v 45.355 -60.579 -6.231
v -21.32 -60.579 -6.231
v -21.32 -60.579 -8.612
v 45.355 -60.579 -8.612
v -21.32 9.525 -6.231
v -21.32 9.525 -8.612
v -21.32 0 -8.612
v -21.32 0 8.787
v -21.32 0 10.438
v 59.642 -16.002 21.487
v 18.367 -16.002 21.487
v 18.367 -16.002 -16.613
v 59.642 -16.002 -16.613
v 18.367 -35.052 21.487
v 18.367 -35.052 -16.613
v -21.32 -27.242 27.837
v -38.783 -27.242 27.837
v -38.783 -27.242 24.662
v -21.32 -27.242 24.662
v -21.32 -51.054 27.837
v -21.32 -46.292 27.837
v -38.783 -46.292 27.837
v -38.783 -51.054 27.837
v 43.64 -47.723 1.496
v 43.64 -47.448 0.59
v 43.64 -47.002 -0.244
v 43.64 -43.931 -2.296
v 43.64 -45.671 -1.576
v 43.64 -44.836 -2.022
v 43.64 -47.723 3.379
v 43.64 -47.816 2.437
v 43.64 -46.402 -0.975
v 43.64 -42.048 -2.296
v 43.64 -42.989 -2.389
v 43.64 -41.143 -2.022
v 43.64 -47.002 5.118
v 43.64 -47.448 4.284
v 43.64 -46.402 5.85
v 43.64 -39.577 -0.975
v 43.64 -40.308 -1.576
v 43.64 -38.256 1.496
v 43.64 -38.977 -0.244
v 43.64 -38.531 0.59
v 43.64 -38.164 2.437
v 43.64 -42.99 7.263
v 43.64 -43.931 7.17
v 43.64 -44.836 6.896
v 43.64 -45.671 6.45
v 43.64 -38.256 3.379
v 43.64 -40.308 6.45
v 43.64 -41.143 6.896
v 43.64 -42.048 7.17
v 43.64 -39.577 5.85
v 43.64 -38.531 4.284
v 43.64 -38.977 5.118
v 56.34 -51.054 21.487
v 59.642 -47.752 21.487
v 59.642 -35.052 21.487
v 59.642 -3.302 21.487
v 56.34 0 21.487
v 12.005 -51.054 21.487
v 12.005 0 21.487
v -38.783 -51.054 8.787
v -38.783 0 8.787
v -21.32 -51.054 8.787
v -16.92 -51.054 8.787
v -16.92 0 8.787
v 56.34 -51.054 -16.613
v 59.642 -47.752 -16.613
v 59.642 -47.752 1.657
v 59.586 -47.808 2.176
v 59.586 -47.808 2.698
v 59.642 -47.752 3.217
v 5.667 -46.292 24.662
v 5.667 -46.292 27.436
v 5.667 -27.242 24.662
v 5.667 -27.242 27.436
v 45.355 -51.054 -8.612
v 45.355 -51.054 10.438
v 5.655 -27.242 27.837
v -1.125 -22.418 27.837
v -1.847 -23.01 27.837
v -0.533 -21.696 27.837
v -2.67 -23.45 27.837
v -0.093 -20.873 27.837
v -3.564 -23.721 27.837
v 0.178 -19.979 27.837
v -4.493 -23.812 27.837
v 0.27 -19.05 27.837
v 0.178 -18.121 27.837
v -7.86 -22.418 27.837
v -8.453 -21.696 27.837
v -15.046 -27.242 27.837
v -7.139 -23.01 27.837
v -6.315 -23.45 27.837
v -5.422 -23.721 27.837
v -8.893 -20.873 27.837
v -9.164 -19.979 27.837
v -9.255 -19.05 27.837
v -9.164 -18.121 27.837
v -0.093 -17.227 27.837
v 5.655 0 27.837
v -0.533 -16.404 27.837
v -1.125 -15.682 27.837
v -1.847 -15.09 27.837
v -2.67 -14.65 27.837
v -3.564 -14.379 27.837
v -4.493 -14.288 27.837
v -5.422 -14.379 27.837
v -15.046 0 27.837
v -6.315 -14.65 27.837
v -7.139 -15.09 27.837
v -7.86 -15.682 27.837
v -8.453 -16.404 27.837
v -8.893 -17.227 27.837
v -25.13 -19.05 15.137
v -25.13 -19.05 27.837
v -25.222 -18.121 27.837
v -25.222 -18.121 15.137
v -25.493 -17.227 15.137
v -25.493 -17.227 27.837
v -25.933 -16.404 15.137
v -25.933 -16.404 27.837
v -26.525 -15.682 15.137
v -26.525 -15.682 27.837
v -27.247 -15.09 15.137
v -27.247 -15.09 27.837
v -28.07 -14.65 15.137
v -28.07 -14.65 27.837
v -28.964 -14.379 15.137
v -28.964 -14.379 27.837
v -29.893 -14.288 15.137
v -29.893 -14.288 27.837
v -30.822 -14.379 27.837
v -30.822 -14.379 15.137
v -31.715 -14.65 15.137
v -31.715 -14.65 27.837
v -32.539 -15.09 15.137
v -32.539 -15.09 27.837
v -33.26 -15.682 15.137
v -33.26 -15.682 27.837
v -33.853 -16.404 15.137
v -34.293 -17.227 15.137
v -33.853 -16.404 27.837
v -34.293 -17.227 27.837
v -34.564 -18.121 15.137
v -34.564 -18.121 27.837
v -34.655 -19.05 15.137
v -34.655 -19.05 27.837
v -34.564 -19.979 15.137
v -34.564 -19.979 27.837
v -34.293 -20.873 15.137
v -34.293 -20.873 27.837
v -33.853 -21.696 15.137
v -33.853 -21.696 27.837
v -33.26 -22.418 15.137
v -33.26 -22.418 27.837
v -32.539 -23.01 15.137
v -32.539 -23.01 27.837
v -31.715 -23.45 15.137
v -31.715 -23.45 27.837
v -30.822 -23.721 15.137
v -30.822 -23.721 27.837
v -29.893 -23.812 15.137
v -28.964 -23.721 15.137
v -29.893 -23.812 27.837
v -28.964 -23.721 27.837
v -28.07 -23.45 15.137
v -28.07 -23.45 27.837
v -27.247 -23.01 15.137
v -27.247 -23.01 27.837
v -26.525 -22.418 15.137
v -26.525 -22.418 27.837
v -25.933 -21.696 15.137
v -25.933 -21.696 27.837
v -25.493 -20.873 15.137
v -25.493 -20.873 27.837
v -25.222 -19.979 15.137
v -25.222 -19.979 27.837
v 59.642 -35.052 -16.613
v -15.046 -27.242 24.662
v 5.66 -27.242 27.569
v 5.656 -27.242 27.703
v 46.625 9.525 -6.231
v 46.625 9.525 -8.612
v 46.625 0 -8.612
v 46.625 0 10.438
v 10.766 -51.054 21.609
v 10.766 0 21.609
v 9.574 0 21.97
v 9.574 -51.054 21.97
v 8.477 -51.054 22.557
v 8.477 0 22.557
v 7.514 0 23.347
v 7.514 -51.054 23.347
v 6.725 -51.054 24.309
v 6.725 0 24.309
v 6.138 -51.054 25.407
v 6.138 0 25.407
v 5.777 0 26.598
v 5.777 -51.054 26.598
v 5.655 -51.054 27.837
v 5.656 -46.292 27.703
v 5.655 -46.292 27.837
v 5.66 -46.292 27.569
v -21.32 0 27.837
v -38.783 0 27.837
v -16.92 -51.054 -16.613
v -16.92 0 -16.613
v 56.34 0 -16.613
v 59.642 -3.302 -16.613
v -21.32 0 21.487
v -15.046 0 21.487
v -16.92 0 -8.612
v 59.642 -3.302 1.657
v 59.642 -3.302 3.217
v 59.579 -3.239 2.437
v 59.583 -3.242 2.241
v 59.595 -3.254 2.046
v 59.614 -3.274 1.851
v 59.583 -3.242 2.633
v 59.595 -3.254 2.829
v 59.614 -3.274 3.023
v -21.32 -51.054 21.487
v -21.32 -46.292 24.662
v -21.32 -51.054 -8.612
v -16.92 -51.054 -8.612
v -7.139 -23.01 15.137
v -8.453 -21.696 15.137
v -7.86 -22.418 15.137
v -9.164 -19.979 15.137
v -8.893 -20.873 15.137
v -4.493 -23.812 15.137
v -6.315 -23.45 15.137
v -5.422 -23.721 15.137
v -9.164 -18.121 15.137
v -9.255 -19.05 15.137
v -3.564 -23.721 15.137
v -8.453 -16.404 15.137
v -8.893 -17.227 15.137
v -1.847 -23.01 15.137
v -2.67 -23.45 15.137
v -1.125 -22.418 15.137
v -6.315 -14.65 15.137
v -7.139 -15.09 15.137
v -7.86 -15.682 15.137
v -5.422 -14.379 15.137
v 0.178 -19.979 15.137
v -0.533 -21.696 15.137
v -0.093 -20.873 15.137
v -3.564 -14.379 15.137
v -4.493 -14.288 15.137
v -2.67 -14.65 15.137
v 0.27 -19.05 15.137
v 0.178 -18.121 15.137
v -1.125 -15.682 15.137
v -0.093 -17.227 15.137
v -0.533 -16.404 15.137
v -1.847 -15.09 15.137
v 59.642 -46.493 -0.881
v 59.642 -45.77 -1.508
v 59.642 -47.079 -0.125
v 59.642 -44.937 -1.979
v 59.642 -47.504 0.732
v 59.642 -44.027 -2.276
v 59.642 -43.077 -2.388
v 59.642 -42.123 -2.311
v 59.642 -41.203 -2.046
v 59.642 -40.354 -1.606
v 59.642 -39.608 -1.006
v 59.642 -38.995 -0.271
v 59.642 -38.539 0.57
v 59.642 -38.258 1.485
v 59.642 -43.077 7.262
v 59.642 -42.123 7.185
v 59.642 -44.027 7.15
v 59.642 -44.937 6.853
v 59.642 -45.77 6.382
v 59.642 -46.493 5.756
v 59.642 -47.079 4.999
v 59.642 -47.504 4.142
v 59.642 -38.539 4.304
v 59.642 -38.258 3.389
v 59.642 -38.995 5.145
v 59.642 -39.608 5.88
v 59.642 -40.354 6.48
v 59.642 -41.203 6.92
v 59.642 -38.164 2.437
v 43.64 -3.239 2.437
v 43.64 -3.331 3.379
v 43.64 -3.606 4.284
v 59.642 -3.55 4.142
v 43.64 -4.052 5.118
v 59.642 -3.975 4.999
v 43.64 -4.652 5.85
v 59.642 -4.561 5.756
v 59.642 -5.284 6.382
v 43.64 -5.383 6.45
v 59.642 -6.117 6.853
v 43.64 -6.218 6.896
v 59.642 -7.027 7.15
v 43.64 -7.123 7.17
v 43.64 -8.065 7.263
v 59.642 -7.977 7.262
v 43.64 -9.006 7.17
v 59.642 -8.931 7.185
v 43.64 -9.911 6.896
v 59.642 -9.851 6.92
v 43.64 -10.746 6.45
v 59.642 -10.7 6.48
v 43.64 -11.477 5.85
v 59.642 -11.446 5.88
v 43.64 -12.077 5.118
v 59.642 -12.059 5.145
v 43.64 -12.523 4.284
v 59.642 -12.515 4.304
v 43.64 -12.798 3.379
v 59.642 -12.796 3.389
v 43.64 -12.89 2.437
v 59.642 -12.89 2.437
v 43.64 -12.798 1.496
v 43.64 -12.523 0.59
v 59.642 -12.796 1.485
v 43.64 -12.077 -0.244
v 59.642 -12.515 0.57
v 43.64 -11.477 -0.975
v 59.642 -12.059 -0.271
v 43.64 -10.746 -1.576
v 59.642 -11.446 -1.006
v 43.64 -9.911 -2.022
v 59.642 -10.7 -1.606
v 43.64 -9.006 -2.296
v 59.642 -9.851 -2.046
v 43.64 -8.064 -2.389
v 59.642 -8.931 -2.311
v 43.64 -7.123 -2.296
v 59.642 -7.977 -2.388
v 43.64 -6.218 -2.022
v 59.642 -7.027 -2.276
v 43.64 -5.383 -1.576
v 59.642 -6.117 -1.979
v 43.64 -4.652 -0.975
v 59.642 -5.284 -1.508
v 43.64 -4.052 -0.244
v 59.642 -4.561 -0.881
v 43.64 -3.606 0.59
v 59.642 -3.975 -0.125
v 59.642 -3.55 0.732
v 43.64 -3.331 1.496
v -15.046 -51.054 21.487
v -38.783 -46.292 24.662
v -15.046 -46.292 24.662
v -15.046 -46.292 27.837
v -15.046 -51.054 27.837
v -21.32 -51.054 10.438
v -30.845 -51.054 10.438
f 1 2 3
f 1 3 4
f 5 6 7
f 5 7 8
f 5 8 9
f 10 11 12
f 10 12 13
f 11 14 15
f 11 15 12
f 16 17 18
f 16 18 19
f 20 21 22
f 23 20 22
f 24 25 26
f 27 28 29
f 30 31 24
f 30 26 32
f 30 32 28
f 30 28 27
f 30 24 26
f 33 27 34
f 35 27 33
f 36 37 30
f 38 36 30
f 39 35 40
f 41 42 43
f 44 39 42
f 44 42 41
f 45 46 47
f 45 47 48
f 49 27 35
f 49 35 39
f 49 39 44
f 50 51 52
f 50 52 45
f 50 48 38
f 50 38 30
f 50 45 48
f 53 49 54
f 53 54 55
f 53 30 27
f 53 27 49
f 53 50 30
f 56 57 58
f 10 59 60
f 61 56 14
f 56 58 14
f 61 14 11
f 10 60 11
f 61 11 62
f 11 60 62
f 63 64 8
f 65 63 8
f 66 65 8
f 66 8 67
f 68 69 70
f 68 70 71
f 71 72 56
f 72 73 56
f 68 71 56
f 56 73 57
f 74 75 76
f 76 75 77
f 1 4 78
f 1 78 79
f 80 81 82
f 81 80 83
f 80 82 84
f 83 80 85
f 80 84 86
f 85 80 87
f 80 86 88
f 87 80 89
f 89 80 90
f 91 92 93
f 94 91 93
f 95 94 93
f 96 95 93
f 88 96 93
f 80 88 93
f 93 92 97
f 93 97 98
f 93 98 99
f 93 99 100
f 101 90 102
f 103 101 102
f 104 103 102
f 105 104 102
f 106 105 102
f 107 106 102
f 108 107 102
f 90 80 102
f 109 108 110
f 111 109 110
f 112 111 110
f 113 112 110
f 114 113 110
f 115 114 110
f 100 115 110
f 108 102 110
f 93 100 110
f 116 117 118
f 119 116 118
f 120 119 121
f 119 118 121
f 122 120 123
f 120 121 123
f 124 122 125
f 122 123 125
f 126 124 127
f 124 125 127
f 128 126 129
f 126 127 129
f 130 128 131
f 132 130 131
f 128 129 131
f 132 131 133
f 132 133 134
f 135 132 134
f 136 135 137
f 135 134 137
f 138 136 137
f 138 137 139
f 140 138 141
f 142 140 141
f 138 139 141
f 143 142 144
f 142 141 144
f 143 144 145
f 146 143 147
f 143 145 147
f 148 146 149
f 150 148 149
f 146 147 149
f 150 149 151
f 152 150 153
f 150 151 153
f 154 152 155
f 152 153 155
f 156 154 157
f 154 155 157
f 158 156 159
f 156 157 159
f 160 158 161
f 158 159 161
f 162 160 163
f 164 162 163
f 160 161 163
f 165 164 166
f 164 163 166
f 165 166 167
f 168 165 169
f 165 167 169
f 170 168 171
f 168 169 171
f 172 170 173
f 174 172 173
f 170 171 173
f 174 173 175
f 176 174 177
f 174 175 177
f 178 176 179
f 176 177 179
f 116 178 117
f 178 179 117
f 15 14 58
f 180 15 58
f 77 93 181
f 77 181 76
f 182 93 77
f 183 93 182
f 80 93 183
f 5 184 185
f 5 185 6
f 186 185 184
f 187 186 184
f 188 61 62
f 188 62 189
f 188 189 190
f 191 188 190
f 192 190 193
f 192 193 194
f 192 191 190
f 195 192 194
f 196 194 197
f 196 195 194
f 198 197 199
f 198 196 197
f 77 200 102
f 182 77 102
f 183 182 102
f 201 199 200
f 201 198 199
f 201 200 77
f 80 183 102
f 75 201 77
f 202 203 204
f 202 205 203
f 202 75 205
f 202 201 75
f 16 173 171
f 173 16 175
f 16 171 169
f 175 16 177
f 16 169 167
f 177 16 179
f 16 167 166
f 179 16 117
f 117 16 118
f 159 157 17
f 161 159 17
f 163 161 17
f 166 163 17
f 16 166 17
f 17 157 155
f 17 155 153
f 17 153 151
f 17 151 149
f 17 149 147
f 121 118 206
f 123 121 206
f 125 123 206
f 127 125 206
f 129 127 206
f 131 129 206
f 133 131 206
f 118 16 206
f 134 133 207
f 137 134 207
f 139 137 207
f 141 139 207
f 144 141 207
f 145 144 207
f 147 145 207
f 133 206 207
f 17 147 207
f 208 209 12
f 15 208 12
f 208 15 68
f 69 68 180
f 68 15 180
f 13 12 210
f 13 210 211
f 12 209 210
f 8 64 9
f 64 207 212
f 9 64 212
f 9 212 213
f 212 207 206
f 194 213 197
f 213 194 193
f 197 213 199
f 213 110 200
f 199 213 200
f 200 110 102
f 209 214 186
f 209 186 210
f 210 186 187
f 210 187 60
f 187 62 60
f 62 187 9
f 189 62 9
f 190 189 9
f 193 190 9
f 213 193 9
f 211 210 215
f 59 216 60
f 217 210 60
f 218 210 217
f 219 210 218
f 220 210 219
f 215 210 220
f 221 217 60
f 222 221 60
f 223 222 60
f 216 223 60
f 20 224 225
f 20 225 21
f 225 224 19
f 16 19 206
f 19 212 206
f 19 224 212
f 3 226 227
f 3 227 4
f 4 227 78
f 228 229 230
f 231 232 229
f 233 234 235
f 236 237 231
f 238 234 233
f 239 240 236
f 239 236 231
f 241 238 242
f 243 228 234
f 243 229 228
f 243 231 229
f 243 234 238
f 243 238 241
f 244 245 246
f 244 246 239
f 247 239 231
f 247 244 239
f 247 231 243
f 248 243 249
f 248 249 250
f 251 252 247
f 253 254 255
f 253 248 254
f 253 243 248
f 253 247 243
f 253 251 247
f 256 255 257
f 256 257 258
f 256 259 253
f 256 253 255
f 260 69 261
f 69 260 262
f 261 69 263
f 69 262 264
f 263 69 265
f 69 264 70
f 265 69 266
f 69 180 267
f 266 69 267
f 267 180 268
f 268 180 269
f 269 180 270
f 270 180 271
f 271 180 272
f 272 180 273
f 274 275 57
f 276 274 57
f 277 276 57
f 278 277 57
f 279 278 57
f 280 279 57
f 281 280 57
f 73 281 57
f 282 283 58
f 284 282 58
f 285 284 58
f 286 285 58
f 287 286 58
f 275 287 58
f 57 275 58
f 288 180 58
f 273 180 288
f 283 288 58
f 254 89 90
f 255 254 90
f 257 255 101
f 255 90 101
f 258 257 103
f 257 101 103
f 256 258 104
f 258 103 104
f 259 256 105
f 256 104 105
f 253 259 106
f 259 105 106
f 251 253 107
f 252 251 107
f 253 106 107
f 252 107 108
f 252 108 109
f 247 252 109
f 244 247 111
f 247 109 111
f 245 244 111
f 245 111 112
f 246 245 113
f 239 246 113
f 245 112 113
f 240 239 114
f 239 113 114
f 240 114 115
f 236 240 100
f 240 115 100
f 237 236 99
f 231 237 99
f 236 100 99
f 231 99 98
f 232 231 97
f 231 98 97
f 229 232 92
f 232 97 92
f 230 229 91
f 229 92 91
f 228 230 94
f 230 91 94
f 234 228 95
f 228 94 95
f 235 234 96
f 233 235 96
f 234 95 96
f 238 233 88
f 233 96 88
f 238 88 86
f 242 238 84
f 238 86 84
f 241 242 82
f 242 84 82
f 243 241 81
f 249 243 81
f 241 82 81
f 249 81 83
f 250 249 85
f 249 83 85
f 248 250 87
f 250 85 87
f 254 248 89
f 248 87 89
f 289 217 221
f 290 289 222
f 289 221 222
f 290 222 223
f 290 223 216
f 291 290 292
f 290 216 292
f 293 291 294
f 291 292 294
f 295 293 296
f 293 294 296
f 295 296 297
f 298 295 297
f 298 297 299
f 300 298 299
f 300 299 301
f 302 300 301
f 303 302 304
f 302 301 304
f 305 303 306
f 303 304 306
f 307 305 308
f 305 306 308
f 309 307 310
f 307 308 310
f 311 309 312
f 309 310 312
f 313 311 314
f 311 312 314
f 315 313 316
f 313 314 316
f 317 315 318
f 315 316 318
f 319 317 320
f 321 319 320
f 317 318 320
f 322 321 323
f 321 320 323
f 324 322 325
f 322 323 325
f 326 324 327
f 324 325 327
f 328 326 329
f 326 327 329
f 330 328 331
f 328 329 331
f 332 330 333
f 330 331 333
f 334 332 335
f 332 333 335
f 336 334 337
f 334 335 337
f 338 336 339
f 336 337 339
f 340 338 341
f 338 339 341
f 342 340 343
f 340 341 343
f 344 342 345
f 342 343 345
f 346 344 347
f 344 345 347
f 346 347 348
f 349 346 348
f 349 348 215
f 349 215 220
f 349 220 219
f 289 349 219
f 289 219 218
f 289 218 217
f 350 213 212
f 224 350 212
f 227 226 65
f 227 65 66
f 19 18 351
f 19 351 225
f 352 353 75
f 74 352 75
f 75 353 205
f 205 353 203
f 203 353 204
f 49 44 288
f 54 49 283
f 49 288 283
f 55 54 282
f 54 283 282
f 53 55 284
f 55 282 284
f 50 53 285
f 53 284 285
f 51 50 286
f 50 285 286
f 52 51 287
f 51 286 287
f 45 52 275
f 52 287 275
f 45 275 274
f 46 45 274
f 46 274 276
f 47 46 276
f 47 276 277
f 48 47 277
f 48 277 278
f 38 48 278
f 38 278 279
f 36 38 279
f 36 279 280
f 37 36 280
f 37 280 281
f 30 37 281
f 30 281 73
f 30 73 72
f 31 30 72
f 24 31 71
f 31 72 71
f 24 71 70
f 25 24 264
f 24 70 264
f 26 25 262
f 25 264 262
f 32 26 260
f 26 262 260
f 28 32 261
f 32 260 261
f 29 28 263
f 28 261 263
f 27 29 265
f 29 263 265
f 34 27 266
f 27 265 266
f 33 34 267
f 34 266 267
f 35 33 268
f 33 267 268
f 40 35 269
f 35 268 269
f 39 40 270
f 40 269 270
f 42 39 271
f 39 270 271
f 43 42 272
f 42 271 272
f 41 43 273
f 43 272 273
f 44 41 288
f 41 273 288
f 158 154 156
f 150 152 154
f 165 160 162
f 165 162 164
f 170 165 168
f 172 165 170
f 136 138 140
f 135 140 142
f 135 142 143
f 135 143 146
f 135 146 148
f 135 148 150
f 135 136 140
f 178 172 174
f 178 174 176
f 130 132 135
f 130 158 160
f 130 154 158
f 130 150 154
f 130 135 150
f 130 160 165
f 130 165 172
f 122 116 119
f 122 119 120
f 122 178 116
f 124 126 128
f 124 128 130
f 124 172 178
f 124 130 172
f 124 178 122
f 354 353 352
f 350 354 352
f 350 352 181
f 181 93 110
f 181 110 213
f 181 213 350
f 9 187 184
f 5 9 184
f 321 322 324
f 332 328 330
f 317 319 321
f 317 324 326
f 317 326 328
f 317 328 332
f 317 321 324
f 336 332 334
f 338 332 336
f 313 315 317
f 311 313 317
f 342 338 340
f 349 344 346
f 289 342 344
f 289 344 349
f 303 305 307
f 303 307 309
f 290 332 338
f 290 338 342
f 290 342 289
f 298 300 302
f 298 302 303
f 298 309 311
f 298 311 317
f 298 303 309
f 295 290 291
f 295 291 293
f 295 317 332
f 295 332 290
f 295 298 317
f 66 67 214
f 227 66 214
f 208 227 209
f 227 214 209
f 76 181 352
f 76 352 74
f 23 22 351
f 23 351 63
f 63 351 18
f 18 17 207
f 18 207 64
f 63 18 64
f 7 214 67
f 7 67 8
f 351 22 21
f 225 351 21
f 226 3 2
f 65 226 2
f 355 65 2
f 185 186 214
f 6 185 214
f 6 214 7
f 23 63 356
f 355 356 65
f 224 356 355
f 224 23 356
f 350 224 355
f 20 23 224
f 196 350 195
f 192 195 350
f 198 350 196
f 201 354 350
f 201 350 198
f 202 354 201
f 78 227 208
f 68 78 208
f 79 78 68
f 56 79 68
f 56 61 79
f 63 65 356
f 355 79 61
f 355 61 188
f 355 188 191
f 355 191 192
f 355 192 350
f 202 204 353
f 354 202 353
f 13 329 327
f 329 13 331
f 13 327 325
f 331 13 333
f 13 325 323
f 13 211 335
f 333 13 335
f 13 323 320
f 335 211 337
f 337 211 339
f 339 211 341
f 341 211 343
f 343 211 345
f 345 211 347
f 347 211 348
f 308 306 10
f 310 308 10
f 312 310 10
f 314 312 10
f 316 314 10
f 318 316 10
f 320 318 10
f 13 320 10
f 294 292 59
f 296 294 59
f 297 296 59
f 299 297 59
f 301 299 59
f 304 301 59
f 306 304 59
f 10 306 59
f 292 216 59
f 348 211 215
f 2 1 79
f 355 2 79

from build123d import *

# Parameters (mm, degrees)
F1_DEPTH  = 51.054
F2_R      = 6.34999
F3_W      = 41.275
F3_H      = 19.05
F4_DEPTH  = 76.2
F5_SIZE2  = 3.302
F5_SIZE   = 3.302
F6_W      = 44.45
F6_H      = 19.05
F7_DEPTH  = 3.175
F8_R      = 4.826
F9_DEPTH  = 16.002
F10_R     = 4.7625
F11_DEPTH = 12.7
F12_W     = 66.675
F12_H     = 19.05
F13_DEPTH = 9.525
F15_DEPTH = 76.2
F16_W     = 67.945
F16_H     = 19.05
F17_DEPTH = 9.525
F19_DEPTH = 85.4085


# Not quite as in the source:
# - a fillet or chamfer is up to 0.001 mm smaller than in the source, because OpenCascade refuses the exact size


with BuildPart() as f1:
    # F0 (on Front) → F1 (new body)
    with BuildSketch(Plane.XZ):
        Polygon((-38.7827743664, 8.7870896519), (-16.9203323245, 8.7870896519), (-16.9203323245, -16.6129103481), (59.6422256336, -16.6129103481), (59.6422256336, 21.4870896519), (5.6545256336, 21.4870896519), (5.6545256336, 27.8370896519), (-15.0464743664, 27.8370896519), (-15.0464743664, 21.4870896519), (-21.3202743664, 21.4870896519), (-21.3202743664, 27.8370896519), (-38.7827743664, 27.8370896519), align=None)
    extrude(amount=F1_DEPTH)

    # F2 (radius 6.35 in the source; OpenCascade refuses exactly that, so slightly less here)
    f2_edges = [f1.edges().sort_by_distance(p)[0] for p in [
        (5.654526, -25.527, 21.48709),
    ]]
    fillet(f2_edges, radius=F2_R)

    # F3 (on face) → F4 (cut)
    with BuildSketch(Plane.XY.offset(21.4870896519)):
        with Locations((39.0047256336, -25.527)):
            Rectangle(F3_W, F3_H)
    extrude(amount=-F4_DEPTH, mode=Mode.SUBTRACT)

    # F5
    f5_edges = [f1.edges().sort_by_distance(p)[0] for p in [
        (59.642226, -51.054, 2.43709),
        (59.642226, 0, 2.43709),
    ]]
    chamfer(f5_edges, length=F5_SIZE, length2=F5_SIZE2)

    # F6 (on face) → F7 (cut)
    with BuildSketch(Plane.XY.offset(27.8370896519)):
        with Locations((-16.5577743664, -36.7665)):
            Rectangle(F6_W, F6_H)
    extrude(amount=-F7_DEPTH, mode=Mode.SUBTRACT)

    # F8 (on face) → F9 (cut)
    with BuildSketch(Plane.YZ.offset(59.6422256336)):
        with Locations((-42.9895, 2.4370896519)):
            Circle(F8_R)
        with Locations((-8.0645, 2.4370896519)):
            Circle(F8_R)
    extrude(amount=-F9_DEPTH, mode=Mode.SUBTRACT)

    # F10 (on face) → F11 (cut)
    with BuildSketch(Plane.XY.offset(27.8370896519)):
        with Locations((-29.8927743664, -19.05)):
            Circle(F10_R)
        with Locations((-4.4927743664, -19.05)):
            Circle(F10_R)
    extrude(amount=-F11_DEPTH, mode=Mode.SUBTRACT)

    # F12 (on face) → F13 (join)
    with BuildSketch(Plane.XZ.offset(51.054)):
        with Locations((12.0172256336, 0.9130896519)):
            Rectangle(F12_W, F12_H)
    extrude(amount=F13_DEPTH)

    # F14 (on face) → F15 (cut)
    with BuildSketch(Plane.YZ.offset(45.3547256336)):
        Polygon((-60.579, -6.2306603481), (-51.054, 10.4380896519), (-60.579, 10.4380896519), align=None)
    extrude(amount=-F15_DEPTH, mode=Mode.SUBTRACT)

    # F16 (on face) → F17 (join)
    with BuildSketch(Plane(origin=(0, 0, 0), x_dir=(-1, 0, 0), z_dir=(0, 1, 0))):
        with Locations((-12.6522256336, 0.9130896519)):
            Rectangle(F16_W, F16_H)
    extrude(amount=F17_DEPTH)

    # F18 (on face) → F19 (cut, through all)
    with BuildSketch(Plane.YZ.offset(46.6247256336)):
        Polygon((0, 10.4380896519), (9.525, -6.2306603481), (9.525, 10.4380896519), align=None)
    extrude(amount=-F19_DEPTH, mode=Mode.SUBTRACT)


solid = f1.part
